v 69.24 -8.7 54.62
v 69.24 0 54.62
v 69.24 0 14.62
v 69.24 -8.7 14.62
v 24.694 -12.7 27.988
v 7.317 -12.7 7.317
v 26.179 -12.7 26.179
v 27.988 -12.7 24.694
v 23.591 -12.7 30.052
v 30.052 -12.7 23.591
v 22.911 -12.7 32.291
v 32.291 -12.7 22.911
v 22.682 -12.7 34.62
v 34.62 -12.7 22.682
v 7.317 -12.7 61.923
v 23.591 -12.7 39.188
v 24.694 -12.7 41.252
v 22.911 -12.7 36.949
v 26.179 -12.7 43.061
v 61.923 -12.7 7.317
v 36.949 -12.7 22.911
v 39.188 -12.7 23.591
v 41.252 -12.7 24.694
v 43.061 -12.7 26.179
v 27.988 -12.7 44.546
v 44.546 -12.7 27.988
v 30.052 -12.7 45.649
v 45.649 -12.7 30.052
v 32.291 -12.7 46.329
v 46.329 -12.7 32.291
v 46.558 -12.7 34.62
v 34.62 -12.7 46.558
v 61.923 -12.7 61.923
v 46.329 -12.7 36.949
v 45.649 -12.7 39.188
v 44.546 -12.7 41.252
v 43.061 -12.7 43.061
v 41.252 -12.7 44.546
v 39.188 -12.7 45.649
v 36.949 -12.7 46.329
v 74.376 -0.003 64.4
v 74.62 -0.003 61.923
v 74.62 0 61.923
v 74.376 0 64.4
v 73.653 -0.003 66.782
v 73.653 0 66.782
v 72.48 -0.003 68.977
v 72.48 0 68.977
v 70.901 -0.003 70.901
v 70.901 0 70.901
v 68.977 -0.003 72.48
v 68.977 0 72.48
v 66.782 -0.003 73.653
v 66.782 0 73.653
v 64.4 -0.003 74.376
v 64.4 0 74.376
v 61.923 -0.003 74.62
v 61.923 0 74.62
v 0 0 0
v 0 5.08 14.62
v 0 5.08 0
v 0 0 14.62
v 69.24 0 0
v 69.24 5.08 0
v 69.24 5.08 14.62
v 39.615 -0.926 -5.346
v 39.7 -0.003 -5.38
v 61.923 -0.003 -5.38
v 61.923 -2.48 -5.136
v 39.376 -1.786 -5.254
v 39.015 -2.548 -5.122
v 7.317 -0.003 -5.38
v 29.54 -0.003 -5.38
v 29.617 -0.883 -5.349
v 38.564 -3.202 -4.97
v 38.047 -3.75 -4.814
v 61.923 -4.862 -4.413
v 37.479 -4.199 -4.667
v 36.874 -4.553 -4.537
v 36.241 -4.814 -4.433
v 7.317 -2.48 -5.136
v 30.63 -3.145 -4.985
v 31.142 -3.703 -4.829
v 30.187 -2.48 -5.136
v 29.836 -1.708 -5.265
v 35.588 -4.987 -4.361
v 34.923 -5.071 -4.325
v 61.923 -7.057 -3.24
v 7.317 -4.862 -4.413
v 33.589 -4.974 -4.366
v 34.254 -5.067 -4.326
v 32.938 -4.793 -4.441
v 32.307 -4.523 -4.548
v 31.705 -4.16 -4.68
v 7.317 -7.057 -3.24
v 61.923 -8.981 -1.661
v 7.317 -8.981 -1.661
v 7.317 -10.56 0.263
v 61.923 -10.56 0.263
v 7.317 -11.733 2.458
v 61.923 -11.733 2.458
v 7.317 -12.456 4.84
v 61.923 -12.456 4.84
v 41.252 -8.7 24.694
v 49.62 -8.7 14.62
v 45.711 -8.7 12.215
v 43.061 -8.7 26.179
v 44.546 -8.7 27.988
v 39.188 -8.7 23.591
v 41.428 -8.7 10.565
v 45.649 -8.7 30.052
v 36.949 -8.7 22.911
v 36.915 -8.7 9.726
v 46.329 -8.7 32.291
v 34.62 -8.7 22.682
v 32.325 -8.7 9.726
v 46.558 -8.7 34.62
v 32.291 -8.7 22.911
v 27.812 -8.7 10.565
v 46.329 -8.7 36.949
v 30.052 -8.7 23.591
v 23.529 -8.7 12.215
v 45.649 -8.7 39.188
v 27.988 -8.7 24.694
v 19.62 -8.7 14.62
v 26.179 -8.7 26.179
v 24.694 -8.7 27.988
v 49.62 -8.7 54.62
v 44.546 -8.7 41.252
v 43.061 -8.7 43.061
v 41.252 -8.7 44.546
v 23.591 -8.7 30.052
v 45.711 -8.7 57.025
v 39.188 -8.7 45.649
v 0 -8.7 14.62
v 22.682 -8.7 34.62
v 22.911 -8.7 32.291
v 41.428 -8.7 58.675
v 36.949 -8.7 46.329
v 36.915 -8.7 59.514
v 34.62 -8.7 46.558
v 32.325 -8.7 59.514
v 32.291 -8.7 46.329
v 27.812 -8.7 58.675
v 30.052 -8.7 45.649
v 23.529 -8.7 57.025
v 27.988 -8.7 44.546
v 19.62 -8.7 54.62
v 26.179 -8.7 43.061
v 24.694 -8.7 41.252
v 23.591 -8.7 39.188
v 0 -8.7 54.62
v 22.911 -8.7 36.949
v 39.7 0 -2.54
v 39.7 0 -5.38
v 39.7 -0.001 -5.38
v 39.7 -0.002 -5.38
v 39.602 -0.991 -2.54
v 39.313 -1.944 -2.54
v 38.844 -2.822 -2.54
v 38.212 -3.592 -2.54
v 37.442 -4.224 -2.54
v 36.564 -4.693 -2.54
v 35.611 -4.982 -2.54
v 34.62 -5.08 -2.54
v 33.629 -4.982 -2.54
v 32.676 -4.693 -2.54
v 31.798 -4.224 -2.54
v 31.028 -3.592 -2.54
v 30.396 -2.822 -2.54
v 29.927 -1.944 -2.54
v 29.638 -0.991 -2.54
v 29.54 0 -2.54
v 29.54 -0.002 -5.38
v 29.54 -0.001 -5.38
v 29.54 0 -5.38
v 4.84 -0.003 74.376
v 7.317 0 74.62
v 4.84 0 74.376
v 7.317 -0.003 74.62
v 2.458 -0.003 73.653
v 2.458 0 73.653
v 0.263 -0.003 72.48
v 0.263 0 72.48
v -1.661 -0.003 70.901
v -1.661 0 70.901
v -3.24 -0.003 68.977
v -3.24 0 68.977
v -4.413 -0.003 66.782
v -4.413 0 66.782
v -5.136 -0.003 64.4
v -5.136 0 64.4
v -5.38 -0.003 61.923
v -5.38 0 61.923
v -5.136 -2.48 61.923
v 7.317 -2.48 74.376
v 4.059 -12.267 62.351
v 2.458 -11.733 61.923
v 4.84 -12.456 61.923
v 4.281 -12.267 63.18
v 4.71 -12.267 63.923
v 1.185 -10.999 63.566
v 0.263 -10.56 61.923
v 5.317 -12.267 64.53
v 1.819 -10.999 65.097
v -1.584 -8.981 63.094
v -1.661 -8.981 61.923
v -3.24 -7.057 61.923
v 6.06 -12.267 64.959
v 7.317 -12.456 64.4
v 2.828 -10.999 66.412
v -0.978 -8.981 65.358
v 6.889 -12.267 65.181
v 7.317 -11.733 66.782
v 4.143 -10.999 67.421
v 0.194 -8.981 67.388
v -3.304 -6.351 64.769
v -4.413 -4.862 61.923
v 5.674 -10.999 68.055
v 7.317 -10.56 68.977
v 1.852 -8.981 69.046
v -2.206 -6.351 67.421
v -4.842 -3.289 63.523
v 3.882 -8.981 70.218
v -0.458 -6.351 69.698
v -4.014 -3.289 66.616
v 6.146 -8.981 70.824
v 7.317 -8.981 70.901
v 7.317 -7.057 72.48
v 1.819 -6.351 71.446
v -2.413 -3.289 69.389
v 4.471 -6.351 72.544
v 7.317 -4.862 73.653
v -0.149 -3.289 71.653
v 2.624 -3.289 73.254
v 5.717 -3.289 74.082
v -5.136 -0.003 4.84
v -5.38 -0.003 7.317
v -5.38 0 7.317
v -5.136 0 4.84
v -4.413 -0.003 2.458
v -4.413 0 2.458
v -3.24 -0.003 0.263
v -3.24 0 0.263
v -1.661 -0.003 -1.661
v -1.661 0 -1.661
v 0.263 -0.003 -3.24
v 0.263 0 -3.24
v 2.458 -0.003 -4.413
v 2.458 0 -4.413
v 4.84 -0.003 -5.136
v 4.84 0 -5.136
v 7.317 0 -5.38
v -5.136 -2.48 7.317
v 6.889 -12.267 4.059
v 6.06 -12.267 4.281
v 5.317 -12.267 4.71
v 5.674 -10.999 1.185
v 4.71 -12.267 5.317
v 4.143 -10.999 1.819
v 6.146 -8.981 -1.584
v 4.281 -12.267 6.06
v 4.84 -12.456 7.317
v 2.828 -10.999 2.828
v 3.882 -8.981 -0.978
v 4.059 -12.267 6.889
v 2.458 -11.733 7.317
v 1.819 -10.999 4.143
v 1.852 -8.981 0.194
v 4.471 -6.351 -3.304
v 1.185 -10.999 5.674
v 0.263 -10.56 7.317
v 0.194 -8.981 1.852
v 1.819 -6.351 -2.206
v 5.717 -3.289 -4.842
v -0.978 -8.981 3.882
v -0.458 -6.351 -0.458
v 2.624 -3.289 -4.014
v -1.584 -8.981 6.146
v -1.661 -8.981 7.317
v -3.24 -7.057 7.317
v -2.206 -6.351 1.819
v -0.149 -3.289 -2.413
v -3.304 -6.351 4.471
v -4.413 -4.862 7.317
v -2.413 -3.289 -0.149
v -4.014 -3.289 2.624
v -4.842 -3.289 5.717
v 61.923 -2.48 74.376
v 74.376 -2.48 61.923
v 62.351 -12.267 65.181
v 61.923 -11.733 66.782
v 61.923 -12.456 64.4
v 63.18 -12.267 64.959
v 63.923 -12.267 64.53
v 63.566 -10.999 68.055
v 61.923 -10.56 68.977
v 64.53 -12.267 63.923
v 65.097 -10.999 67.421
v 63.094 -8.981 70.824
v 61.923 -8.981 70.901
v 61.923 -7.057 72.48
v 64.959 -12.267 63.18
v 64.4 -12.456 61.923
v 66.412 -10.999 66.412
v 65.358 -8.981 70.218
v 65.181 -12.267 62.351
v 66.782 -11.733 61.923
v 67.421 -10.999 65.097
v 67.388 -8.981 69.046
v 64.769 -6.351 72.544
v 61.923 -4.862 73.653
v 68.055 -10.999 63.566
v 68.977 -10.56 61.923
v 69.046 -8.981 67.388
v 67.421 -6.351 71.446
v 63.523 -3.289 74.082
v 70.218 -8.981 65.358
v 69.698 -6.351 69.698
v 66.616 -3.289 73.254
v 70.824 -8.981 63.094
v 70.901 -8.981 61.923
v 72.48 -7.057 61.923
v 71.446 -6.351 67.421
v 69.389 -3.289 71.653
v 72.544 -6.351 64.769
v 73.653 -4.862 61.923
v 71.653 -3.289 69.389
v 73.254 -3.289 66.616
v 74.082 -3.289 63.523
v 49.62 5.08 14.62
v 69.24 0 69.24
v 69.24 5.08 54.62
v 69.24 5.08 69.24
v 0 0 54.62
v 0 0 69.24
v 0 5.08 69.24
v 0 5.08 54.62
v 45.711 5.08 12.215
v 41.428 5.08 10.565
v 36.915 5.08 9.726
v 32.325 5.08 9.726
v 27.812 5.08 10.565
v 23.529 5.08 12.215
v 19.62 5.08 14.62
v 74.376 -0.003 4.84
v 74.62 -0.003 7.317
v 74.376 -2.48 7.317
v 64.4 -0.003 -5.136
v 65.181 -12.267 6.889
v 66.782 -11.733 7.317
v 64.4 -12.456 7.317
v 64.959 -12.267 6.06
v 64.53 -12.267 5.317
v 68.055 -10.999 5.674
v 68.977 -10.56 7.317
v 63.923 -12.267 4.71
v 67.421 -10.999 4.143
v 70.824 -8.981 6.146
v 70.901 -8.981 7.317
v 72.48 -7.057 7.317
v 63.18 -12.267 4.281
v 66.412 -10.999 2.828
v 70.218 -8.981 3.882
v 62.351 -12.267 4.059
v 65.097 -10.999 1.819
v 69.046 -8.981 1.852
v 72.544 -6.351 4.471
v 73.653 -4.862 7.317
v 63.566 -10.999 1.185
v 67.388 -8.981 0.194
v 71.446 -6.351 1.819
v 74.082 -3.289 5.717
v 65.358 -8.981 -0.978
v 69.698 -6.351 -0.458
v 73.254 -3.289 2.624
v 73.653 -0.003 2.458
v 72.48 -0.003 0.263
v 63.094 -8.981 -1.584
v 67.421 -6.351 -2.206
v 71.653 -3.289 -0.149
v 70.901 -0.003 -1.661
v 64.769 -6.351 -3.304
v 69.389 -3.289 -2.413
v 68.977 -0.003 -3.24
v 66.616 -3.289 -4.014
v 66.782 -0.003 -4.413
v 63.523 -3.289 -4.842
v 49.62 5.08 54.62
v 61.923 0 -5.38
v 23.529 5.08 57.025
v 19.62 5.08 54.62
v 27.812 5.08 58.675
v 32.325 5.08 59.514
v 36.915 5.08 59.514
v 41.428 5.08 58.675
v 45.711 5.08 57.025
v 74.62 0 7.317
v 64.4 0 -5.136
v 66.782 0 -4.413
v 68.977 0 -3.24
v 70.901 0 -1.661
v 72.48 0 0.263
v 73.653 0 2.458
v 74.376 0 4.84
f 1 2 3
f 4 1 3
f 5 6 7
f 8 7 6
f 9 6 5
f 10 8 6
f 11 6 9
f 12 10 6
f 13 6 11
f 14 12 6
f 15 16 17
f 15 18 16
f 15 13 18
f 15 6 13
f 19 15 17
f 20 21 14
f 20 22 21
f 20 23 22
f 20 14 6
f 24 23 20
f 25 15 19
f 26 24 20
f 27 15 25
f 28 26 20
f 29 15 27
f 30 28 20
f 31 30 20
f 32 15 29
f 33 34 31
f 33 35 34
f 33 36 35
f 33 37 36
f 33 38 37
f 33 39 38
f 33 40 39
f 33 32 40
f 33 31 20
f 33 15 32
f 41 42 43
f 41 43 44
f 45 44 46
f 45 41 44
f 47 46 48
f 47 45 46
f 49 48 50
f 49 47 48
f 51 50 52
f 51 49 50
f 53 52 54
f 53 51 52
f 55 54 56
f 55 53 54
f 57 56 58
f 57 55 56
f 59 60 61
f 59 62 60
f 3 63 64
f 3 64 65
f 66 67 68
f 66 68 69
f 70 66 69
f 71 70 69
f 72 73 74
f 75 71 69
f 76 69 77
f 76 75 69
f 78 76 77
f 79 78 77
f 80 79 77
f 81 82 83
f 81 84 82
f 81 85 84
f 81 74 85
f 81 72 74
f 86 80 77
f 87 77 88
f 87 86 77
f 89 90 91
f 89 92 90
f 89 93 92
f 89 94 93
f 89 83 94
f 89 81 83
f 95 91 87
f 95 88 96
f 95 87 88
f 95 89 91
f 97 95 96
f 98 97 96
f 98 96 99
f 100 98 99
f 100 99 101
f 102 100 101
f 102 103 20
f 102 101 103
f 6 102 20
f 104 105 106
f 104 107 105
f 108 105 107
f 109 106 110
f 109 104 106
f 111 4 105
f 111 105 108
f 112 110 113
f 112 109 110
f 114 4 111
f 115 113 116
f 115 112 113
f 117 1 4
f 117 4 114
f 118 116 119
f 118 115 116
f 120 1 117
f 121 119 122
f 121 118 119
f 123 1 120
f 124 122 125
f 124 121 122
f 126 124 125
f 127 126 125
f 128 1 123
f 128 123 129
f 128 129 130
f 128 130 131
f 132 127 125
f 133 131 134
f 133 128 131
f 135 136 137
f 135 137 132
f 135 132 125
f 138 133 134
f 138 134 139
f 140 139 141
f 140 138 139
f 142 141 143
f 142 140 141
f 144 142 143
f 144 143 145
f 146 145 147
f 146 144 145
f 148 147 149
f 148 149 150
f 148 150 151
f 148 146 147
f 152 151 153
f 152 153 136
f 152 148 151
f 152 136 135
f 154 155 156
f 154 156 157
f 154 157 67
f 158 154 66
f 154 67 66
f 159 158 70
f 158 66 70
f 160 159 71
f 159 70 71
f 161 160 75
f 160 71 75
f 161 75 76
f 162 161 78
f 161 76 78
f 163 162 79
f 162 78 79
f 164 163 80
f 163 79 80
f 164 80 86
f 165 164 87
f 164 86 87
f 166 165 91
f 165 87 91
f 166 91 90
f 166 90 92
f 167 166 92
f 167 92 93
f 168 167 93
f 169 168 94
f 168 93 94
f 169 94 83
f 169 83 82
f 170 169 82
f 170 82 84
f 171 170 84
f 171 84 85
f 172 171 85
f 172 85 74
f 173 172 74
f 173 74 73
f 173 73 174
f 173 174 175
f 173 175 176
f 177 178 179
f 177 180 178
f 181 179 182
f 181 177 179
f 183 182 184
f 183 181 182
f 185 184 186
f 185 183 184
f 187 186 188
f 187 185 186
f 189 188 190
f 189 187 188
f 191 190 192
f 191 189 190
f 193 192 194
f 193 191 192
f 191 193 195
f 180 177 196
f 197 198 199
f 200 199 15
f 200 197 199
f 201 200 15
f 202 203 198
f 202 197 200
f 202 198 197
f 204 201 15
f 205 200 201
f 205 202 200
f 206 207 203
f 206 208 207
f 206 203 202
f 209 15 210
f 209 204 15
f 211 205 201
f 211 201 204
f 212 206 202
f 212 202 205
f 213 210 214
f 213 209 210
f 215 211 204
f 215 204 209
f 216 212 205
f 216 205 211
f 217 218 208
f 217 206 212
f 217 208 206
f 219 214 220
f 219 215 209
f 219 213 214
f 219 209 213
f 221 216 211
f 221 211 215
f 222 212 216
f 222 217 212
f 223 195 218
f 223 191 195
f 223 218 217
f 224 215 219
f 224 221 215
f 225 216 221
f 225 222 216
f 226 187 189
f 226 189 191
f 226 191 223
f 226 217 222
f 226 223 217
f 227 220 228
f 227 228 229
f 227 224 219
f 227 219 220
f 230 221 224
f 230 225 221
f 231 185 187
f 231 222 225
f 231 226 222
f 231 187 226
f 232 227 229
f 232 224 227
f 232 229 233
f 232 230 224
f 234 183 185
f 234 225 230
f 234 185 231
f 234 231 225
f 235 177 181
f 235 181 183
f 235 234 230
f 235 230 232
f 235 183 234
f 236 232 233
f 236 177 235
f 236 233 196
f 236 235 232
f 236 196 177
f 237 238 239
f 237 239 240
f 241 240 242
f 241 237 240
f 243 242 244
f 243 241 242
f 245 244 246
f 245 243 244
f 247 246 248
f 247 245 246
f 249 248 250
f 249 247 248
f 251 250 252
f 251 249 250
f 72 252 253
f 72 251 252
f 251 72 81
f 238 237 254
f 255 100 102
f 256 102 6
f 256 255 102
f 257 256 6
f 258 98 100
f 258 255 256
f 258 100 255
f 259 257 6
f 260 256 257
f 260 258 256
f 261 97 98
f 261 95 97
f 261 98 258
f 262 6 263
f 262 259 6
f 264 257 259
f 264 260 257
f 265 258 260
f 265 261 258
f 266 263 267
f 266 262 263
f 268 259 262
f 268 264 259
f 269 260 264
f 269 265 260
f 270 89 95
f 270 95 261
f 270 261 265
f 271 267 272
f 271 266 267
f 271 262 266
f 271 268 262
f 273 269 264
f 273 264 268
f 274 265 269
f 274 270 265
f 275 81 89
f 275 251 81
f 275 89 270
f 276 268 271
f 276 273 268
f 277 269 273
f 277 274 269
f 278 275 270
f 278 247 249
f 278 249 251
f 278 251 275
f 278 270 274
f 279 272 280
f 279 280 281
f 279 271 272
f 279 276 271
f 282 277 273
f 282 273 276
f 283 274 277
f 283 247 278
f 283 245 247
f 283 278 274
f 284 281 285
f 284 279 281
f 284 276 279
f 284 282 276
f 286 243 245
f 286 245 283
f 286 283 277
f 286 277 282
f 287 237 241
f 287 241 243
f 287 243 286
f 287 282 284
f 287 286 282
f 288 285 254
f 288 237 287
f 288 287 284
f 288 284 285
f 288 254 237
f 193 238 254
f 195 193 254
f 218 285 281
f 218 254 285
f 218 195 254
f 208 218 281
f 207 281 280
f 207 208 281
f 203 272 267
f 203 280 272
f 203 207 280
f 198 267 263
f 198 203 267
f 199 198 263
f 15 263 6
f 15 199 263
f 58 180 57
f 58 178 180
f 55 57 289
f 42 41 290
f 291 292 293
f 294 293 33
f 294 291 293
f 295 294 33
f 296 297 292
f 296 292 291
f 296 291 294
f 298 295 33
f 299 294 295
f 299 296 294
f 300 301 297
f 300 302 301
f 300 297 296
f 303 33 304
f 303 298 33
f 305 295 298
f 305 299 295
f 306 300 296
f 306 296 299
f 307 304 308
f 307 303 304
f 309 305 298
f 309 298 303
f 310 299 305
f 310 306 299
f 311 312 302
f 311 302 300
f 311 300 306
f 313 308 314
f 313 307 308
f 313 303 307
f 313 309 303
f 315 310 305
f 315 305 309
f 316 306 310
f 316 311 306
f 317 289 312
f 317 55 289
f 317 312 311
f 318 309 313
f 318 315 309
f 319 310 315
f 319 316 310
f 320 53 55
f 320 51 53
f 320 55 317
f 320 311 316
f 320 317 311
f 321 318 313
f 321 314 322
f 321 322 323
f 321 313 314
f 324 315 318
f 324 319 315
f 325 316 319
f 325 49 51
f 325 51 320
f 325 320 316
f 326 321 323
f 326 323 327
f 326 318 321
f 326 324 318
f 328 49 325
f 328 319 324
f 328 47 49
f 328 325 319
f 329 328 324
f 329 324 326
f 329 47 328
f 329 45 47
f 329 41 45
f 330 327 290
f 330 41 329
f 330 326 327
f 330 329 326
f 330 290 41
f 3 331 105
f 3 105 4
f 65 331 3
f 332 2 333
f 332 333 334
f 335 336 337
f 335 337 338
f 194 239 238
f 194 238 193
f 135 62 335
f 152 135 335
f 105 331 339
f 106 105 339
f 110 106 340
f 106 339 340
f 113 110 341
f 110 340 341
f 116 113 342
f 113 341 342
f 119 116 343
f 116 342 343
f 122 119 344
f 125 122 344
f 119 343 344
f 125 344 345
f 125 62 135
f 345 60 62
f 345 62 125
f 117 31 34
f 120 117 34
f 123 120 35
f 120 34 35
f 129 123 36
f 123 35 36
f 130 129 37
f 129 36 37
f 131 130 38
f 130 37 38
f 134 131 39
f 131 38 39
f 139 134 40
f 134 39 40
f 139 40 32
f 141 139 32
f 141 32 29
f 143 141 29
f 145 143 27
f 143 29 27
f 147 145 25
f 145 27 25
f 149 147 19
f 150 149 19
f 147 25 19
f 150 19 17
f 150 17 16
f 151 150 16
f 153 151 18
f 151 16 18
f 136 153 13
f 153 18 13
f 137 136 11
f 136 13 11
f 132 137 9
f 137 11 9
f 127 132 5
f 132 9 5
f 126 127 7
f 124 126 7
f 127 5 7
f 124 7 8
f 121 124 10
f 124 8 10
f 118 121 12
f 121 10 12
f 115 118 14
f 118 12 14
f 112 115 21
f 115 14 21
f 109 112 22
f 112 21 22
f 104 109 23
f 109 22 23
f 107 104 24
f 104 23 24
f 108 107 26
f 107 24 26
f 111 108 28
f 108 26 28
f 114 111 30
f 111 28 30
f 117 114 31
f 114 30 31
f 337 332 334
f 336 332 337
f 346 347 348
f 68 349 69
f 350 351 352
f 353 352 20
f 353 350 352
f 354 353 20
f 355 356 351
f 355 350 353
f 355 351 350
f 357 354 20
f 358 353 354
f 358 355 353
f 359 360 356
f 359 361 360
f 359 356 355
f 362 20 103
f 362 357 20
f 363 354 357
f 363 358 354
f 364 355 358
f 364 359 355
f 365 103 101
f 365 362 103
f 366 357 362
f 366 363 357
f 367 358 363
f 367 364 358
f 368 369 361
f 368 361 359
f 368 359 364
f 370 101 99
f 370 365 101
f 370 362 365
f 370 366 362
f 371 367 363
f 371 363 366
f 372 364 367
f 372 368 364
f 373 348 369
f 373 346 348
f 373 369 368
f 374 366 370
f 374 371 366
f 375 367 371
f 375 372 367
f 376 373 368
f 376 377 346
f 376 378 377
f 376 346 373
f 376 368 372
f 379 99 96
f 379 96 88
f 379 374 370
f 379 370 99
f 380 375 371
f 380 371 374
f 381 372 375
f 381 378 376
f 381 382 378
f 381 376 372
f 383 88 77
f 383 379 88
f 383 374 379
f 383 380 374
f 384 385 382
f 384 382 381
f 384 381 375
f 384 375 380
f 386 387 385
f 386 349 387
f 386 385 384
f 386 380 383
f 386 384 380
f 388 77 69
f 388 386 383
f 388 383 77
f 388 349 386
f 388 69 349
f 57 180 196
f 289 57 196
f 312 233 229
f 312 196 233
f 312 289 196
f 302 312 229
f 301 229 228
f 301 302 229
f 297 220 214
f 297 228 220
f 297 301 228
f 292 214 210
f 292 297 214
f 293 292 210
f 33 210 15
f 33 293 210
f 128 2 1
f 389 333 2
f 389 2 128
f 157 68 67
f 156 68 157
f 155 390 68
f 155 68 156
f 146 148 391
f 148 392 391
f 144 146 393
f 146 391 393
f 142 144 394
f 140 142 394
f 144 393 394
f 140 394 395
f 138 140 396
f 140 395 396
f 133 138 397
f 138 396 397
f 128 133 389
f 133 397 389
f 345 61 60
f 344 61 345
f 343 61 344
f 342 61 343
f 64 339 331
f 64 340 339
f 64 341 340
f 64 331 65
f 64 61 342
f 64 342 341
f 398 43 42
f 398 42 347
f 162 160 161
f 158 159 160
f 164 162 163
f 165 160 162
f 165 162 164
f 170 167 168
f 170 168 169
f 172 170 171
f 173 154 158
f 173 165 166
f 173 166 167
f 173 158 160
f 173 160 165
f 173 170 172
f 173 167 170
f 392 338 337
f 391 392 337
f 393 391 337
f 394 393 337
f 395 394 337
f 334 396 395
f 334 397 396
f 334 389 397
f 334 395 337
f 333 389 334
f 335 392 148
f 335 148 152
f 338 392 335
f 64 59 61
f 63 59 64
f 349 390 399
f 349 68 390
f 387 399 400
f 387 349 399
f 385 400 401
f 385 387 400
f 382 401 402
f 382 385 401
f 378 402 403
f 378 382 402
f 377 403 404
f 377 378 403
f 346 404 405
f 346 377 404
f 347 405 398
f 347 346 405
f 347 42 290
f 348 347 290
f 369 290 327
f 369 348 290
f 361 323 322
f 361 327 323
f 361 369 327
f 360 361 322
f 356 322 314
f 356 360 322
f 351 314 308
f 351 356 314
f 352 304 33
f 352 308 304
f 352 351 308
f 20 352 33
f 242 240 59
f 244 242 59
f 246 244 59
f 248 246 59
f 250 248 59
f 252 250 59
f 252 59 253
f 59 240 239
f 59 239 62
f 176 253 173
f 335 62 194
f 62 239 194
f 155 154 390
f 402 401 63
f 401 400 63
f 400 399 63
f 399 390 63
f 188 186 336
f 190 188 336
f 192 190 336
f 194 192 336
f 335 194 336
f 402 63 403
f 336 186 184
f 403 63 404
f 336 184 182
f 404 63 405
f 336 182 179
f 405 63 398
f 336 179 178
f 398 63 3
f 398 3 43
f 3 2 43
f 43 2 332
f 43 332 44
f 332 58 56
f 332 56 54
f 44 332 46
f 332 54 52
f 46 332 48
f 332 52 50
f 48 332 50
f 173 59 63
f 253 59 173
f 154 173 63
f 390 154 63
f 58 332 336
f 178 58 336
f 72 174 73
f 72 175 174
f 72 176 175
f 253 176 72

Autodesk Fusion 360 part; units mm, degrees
sketch "Sketch1" plane through (0, 0, 0) normal (0, 1, 0) x (1, 0, 0)
  line L0 (0, 0) -> (69.24, 0)
  line L1 (69.24, 0) -> (69.24, -69.24)
  line L2 (69.24, -69.24) -> (0, -69.24)
  line L3 (0, -69.24) -> (0, 0)
  dimension "d1" = 69.24
  dimension "d2" = 69.24
extrude "Extrude1" add sketch "Sketch1" along normal blind 5.08
sketch "Sketch2" plane through (0, 0, 0) normal (0, -1, 0) x (1, 0, 0)
  line L0 (69.24, 69.24) -> (0, 69.24)
  line L1 (0, 69.24) -> (0, 0)
  line L2 (0, 0) -> (69.24, 0)
  line L3 (69.24, 0) -> (69.24, 69.24)
  line L4 (-5.38, 74.62) -> (74.62, 74.62)
  line L5 (74.62, 74.62) -> (74.62, -5.38)
  line L6 (74.62, -5.38) -> (-5.38, -5.38)
  line L7 (-5.38, -5.38) -> (-5.38, 74.62)
  point P0 (34.62, 69.24)
  point P1 (34.62, 74.62)
  point P2 (0, 34.62)
  point P3 (-5.38, 34.62)
  dimension "d5" = 80
  dimension "d6" = 80
extrude "Extrude2" add sketch "Sketch2" along normal blind 12.7 contours L0 L1 L2 L3 | L4 L5 L6 L7
fillet "Fillet1" radius 12.7 8 edges at (-5.38, -6.35, 74.62) (74.62, -6.35, 74.62) (74.62, -6.35, -5.38) (-5.38, -6.35, -5.38) (34.62, -12.7, 74.62) (-5.38, -12.7, 34.62) (74.62, -12.7, 34.62) (34.62, -12.7, -5.38)
sketch "Sketch4" plane through (0, -12.7, 0) normal (0, -1, 0) x (1, 0, 0)
  line L0 (7.32, 7.32) -> (61.92, 7.32)
  line L1 (61.92, 7.32) -> (61.92, 61.92)
  line L2 (61.92, 61.92) -> (7.32, 61.92)
  line L3 (7.32, 61.92) -> (7.32, 7.32)
  circle A0 centre (34.62, 34.62) radius 11.938
  dimension "d18" = 23.876
extrude "Extrude4" cut sketch "Sketch4" against normal up to surface (17.78 mm away) contours A0
sketch "Sketch5" plane through (0, 5.08, 0) normal (0, 1, 0) x (-1, 0, 0)
  circle A0 centre (-34.62, 34.62) radius 11.938
  line L0 (0, 69.24) -> (-69.24, 69.24)
  line L1 (-69.24, 69.24) -> (-69.24, 0)
  line L2 (-69.24, 0) -> (0, 0)
  line L3 (0, 0) -> (0, 69.24)
  circle A1 centre (-34.62, 34.62) radius 25
  line L4 (-69.24, 54.62) -> (0, 54.62)
  line L5 (0, 54.62) -> (0, 14.62)
  line L6 (0, 14.62) -> (-69.24, 14.62)
  line L7 (-69.24, 14.62) -> (-69.24, 54.62)
  line L8 (-69.24, 54.62) -> (0, 14.62) construction
  line L9 (0, 54.62) -> (-69.24, 14.62) construction
  point P0 (-34.62, 34.62)
  dimension "d21" = 50
  dimension "d24" = 40
extrude "Extrude5" cut sketch "Sketch5" against normal blind 13.78 contours L3 A1 L4 L5 L6 | L1 A1 L4 L6 L7 | A1 L4 | A1 L4 L6 | A1 L6
ref_plane "WorkPlane2" through (34.62, 2.54, -7.62) normal (0, 0, -1) x (-1, 0, 0)
sketch "Sketch7" plane through (0, 0, -7.62) normal (0, 0, -1) x (-1, 0, 0)
  line L0 (-61.92, 0) -> (-7.32, 0)
  circle A0 centre (-34.62, 0) radius 5.08
  dimension "d28" = 10.16
extrude "Extrude6" cut sketch "Sketch7" against normal blind 5.08 contours L0 A0 picked at (-34.2432, -1.6509)
equation "d1 = 8 cm - 0.4 in - 0.6 mm"
equation "d2 = 8 cm - 0.4 in - 0.6 mm"
equation "d22 = -( 0.7 in - 0.4 cm )"
